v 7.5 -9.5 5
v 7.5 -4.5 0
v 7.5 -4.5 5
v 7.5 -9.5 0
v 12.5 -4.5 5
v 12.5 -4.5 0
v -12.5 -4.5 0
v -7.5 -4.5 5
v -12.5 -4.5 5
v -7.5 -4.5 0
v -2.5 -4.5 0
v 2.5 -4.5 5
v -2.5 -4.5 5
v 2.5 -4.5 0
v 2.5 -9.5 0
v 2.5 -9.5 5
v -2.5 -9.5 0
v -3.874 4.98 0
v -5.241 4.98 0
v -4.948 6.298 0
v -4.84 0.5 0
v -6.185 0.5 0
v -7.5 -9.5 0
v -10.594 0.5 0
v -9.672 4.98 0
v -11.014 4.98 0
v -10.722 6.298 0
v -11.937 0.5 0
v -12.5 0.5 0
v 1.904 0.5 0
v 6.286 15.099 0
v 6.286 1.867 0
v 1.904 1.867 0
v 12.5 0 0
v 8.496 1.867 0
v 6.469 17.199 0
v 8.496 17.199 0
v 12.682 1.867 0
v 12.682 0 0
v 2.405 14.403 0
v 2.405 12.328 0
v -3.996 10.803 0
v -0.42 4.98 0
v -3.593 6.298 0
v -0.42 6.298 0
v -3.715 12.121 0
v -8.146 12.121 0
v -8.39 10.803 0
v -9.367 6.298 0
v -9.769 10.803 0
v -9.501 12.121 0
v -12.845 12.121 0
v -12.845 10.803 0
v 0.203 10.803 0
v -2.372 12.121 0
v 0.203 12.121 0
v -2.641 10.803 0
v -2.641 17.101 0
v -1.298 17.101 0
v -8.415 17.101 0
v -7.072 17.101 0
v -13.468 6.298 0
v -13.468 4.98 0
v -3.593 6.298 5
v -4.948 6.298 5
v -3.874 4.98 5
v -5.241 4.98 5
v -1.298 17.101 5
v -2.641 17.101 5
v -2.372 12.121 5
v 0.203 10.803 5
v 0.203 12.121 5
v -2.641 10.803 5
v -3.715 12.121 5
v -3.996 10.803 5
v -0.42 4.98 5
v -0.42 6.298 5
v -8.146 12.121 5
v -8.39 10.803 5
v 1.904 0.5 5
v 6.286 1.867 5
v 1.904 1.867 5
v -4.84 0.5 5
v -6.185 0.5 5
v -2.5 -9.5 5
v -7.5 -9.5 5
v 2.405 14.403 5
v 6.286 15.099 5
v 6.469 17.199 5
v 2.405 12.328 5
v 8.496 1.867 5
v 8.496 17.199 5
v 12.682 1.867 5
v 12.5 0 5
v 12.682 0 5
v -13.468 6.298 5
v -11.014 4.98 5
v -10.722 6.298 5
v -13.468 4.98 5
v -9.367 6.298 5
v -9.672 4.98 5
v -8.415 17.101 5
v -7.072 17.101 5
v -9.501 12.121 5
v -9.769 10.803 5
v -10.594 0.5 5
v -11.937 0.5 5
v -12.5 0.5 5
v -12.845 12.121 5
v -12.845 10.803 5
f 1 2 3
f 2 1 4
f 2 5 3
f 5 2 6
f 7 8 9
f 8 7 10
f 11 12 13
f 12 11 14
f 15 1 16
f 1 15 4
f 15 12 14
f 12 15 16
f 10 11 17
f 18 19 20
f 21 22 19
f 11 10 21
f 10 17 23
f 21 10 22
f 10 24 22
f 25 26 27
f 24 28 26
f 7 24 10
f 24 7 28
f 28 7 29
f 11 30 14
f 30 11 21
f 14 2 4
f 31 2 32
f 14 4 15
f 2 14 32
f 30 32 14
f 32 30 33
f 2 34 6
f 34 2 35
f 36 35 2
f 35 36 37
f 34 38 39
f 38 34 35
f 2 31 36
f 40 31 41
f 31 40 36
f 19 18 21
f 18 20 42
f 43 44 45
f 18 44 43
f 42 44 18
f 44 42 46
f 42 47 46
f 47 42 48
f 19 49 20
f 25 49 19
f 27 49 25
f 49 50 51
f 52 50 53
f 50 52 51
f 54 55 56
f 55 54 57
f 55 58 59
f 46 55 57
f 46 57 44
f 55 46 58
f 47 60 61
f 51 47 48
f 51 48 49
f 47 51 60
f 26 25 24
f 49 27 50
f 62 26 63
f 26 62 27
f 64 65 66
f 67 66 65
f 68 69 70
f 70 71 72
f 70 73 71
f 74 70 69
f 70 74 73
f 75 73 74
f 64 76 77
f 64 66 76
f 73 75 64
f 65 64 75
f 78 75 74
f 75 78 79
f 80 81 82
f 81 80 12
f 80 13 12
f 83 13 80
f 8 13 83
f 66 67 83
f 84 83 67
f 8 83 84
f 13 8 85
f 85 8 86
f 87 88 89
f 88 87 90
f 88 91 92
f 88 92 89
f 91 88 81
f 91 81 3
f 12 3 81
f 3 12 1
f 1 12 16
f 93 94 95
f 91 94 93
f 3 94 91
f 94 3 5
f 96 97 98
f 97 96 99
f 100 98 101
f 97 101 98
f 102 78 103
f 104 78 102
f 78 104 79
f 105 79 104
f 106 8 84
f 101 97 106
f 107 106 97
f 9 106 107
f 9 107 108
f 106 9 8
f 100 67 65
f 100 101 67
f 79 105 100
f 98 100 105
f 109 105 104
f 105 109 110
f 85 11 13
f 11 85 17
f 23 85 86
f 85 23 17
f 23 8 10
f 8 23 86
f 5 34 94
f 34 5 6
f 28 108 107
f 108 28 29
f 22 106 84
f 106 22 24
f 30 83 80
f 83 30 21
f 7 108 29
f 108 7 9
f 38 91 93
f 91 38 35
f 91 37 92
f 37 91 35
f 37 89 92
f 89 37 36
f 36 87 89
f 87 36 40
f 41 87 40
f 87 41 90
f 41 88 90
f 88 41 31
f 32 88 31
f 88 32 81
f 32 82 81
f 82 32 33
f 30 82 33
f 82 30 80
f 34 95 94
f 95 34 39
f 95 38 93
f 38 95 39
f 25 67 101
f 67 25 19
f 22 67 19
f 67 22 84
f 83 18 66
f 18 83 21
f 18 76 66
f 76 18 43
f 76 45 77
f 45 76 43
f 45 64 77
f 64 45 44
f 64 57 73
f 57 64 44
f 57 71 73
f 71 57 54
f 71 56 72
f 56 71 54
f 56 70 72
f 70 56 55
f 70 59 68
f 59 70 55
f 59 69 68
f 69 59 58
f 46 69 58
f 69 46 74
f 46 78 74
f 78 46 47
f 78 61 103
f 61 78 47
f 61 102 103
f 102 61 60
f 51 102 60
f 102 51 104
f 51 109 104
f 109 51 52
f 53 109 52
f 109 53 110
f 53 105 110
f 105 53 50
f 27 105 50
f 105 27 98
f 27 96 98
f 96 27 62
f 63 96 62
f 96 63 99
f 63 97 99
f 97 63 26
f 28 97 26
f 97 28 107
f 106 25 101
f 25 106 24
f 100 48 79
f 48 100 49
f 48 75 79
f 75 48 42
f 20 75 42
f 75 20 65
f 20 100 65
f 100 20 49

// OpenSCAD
$fn=60;
base_height = 2;
foot_depth = 5;
foot_width = 25;
rank = 1;

trophy_number();

module trophy_number() {
    rank_text = str("#", rank);
    union() {
        linear_extrude(5) {
            text(rank_text, size = 18,  halign = "center", valign = "bottom");        
        }
        rotate([-90,0,0]) {
            translate([0, -foot_depth / 2, - base_height]) {
                foot();
            }
        }
    }
}

module foot() {
    cube([foot_width, foot_depth, foot_depth], center = true);
    translate([0,0,-foot_depth]) {
        translate([foot_depth, 0]) cube([foot_depth, foot_depth, foot_depth], center = true);
        translate([-foot_depth, 0]) cube([foot_depth, foot_depth, foot_depth], center = true);
    }
}
